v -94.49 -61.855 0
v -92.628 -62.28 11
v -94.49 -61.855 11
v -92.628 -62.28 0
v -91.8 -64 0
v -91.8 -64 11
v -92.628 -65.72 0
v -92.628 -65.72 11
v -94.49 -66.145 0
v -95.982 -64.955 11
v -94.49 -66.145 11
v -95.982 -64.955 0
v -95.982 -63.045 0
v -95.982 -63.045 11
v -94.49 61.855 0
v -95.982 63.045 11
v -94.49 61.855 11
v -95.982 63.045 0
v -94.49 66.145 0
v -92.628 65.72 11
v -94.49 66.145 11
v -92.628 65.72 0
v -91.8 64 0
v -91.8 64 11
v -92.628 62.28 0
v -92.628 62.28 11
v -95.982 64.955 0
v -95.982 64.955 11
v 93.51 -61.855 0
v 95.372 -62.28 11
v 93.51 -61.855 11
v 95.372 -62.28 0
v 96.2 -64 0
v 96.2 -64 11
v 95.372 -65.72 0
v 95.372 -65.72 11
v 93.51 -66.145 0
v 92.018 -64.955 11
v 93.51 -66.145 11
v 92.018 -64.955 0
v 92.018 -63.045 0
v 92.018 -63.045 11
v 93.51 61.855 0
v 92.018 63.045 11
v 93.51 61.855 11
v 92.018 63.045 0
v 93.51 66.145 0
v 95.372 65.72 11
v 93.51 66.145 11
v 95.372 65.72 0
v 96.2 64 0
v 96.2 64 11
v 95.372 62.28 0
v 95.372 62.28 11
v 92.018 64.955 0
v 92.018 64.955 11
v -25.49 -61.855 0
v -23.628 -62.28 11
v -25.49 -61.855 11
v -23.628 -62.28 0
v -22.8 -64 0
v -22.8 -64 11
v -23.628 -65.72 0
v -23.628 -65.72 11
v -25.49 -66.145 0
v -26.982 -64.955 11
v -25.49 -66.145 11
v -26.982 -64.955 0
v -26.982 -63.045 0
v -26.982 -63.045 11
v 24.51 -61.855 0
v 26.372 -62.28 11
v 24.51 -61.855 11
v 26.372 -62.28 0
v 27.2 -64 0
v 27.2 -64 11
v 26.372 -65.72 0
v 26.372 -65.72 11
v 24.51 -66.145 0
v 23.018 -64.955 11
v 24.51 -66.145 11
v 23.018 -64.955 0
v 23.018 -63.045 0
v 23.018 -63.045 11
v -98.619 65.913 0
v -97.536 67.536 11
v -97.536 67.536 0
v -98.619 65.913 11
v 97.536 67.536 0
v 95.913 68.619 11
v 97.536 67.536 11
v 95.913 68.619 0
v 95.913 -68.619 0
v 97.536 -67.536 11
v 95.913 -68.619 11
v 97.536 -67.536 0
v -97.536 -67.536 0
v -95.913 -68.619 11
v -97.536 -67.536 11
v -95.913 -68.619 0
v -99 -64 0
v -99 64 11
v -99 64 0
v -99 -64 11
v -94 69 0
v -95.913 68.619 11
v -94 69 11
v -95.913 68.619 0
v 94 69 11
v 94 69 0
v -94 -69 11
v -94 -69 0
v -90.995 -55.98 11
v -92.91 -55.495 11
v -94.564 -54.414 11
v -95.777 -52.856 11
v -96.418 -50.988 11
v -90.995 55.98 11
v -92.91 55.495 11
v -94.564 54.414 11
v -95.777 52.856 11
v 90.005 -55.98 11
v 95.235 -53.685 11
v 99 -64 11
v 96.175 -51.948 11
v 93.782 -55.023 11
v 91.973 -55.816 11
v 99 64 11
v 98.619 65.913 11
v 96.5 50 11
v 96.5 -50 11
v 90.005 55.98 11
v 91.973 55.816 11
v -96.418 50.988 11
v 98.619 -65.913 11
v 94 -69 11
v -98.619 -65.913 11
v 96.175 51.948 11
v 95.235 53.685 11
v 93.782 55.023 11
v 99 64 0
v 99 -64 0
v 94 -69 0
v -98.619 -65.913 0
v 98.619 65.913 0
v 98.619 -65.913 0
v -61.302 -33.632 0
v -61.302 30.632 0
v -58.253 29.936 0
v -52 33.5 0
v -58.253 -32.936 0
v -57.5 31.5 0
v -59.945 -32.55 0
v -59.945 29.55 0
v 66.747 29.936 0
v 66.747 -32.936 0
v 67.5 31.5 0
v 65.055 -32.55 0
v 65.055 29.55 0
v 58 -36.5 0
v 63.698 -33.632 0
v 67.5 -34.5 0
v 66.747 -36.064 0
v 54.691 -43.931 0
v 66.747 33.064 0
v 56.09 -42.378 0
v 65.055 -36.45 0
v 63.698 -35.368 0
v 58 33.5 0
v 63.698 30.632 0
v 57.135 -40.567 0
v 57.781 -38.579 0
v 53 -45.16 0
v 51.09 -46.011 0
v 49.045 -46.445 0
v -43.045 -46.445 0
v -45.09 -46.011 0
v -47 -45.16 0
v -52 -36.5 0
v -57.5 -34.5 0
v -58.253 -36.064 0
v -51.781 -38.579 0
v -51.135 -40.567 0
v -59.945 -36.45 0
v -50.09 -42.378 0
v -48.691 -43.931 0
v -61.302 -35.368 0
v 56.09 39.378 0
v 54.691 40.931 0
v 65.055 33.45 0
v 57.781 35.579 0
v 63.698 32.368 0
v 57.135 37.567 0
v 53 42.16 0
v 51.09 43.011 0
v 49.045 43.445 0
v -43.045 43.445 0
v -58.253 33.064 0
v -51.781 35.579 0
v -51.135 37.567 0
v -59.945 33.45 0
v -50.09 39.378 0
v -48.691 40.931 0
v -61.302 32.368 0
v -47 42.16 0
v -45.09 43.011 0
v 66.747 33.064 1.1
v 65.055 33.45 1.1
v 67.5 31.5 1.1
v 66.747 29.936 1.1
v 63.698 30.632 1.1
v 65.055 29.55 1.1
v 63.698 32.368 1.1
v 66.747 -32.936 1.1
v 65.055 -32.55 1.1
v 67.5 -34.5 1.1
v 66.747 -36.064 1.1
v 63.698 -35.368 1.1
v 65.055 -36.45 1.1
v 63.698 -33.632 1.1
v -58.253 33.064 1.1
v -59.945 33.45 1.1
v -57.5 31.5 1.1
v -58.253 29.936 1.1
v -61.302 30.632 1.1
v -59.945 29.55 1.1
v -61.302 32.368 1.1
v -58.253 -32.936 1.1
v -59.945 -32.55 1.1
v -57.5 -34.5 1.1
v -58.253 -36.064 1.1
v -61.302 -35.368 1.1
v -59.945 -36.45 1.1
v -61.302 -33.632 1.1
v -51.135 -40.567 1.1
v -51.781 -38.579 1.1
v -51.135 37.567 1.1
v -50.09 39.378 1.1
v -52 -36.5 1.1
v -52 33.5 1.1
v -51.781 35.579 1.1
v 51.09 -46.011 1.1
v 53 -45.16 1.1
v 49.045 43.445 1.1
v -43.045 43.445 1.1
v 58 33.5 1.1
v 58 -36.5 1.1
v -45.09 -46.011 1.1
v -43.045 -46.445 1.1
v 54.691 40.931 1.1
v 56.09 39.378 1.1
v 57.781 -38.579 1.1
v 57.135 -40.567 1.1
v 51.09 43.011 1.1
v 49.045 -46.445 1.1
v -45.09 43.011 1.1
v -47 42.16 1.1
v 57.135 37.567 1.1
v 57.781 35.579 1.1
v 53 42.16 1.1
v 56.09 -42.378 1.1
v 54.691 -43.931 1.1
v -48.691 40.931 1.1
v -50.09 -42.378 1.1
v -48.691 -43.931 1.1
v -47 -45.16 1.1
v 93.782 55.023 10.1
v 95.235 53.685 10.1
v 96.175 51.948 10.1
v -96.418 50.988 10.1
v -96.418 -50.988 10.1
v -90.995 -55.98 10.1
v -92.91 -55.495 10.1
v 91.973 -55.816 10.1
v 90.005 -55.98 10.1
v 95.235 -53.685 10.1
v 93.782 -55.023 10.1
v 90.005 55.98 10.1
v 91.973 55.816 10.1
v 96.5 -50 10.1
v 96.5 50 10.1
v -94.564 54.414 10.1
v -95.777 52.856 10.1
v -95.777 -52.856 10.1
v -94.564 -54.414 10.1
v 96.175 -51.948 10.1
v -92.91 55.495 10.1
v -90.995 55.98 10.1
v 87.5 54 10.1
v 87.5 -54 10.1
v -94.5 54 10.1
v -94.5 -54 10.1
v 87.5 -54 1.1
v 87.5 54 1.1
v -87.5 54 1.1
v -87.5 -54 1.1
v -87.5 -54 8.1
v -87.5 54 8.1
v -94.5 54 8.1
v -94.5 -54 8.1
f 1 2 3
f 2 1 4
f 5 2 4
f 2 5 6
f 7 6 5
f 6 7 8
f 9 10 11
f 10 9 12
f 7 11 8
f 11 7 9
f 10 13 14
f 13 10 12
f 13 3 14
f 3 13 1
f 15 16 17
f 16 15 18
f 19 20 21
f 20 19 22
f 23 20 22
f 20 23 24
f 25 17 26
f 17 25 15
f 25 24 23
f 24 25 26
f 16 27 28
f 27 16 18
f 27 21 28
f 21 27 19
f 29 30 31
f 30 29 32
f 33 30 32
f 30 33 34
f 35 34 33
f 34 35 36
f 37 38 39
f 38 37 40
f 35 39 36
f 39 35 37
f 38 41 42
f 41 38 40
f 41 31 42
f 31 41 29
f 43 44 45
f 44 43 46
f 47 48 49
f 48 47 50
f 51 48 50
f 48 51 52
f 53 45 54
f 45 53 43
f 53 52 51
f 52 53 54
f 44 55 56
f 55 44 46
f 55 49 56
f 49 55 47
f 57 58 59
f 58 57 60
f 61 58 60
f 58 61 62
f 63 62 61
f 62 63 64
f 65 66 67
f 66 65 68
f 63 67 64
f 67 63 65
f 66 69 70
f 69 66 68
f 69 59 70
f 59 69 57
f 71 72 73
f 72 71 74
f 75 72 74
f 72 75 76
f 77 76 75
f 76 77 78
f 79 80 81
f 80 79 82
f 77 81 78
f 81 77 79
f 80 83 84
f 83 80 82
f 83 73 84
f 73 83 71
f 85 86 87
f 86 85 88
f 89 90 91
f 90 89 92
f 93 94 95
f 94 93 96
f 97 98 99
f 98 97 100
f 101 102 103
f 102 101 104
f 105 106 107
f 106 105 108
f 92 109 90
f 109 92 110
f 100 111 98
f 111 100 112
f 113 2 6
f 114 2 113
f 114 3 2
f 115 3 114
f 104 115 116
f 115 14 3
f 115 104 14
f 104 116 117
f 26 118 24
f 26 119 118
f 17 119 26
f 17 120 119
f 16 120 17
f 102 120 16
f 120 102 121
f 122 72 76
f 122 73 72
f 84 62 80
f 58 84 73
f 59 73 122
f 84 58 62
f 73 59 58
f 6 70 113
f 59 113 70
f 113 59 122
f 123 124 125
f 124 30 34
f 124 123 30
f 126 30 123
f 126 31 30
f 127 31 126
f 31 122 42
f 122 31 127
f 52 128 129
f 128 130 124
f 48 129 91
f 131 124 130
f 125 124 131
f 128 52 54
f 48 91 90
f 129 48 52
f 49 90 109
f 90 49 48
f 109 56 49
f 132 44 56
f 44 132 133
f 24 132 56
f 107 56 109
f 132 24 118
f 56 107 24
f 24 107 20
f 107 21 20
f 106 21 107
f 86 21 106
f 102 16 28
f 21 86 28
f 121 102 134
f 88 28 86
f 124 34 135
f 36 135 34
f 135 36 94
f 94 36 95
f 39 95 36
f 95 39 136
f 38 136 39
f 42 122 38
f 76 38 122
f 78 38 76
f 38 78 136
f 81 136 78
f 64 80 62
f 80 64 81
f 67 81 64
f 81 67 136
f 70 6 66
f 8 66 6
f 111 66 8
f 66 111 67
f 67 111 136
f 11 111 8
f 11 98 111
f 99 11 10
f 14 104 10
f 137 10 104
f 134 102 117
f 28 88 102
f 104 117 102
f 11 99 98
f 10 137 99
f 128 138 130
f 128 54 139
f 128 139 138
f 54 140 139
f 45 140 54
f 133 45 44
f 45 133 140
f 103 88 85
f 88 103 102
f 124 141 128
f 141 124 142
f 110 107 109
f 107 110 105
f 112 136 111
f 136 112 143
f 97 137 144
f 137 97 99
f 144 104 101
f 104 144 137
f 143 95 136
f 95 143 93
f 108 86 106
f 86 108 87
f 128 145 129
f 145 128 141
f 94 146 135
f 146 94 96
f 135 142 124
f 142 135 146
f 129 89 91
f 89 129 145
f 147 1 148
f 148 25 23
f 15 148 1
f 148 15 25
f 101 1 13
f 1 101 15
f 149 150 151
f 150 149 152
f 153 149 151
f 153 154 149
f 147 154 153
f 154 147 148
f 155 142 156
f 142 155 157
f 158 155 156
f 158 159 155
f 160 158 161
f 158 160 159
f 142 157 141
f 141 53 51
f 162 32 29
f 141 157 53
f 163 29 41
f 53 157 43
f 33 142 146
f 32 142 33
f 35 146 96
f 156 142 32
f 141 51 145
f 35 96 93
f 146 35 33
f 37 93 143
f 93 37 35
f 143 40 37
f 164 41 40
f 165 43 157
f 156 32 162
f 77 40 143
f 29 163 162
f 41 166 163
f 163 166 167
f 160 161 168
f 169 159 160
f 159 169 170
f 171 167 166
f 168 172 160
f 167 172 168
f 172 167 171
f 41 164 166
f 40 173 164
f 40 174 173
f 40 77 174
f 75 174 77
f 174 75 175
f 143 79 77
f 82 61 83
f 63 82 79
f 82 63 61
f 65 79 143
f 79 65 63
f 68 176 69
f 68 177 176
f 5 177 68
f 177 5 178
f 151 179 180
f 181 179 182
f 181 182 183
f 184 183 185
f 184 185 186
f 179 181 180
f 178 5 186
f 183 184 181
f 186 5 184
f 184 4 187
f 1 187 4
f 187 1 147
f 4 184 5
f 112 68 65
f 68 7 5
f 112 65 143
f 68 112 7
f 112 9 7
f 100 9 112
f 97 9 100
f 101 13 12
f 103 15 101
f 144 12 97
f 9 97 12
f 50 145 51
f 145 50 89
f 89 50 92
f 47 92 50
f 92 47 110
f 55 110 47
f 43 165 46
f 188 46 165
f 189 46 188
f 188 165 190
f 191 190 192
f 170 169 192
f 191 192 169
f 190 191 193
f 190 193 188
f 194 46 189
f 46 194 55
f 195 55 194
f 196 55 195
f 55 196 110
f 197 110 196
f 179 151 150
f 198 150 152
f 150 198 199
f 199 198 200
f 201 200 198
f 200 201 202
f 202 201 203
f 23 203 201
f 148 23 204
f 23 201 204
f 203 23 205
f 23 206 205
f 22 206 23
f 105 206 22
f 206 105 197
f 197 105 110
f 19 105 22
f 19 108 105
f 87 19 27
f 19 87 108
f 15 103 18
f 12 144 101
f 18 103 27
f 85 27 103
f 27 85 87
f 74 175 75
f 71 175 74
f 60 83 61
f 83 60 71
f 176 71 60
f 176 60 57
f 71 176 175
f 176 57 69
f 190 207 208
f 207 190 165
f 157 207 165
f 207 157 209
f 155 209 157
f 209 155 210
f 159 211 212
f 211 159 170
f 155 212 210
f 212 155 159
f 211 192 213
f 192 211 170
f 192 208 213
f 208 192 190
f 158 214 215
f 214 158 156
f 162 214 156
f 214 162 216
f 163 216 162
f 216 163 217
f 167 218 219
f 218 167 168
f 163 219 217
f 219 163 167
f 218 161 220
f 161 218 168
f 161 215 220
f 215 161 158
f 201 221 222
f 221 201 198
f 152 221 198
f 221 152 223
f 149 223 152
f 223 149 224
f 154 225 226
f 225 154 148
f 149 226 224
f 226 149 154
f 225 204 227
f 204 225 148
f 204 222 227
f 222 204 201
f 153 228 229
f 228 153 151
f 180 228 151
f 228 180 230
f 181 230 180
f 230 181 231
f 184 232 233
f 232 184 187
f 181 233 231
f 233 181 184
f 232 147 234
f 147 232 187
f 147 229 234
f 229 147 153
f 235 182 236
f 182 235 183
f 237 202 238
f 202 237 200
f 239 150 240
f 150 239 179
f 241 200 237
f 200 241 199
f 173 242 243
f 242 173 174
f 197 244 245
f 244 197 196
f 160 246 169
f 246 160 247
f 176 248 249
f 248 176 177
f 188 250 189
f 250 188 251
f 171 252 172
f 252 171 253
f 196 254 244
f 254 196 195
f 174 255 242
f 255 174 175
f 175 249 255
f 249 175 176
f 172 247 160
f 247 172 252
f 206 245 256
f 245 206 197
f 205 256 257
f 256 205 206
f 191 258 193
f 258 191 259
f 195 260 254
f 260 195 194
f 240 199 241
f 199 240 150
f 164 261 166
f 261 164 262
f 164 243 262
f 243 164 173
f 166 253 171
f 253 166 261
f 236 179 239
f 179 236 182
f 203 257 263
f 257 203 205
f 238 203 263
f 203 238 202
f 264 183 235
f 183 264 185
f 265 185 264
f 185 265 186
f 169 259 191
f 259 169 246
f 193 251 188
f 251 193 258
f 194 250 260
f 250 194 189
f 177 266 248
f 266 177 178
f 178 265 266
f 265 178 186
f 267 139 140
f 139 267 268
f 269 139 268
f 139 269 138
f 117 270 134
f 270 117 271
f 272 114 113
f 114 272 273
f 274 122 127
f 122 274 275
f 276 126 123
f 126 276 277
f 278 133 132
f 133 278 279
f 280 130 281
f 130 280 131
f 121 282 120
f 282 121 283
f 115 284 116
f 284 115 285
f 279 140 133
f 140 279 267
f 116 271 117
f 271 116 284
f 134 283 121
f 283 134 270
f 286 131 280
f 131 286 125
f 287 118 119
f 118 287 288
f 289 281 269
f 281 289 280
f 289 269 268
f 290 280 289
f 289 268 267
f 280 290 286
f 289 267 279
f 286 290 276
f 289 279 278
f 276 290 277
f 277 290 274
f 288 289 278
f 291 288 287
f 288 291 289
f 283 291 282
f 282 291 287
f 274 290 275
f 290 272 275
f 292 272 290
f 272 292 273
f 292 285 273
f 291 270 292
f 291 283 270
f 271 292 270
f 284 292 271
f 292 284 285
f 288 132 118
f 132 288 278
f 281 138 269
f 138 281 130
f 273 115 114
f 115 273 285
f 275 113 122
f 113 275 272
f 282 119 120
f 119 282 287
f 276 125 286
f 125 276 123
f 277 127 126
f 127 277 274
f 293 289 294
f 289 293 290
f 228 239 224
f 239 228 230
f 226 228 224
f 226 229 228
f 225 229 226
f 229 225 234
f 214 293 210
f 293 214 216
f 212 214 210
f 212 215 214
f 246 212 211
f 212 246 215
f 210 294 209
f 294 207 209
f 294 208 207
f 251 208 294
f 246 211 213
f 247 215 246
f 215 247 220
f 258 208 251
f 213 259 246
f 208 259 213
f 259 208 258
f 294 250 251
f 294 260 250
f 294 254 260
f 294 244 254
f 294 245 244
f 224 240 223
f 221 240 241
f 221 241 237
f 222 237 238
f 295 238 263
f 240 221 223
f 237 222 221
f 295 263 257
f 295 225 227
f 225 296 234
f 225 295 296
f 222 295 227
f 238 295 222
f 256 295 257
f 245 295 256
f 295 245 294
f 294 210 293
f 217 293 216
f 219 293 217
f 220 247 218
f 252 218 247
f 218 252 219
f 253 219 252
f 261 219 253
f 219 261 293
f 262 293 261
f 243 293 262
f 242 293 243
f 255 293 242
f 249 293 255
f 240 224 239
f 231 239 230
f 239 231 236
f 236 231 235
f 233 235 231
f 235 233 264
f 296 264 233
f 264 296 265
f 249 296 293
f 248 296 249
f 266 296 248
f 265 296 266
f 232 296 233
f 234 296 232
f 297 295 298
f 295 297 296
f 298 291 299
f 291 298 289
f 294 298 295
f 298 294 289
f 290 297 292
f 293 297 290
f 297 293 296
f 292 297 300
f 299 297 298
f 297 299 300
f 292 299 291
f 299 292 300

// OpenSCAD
//translate([100,-70+x,0]) import("component/pi_model_v4.stl");
//translate([-100,59,0])  rotate([90,0,0]) import("component/screen_fond.stl");

screen_l = 193;
screen_lg = 112;
screen_r = 6;

trou_l = 125;
trou_lg = 66;
d_e1 = 3;
d_e2 = -1.5;
screen_vis = [[trou_l/2+d_e1, trou_lg/2+d_e2], [trou_l/2+d_e1, -trou_lg/2+d_e2]
    , [-trou_l/2+d_e1, trou_lg/2+d_e2], [-trou_l/2+d_e1, -trou_lg/2+d_e2]];

boitier_l = 200;
boitier_lg = 140;
boitier_y = -boitier_lg/2-10;

boitier_h = 40;

vis_r1 = 2.2;
vis_r2 = 4.2;

x =0;

y_camera = -boitier_lg/2+6;

//$fn=50;

module screen_int(){
    screen_l_int = 110;
    screen_lg_int = 90;
    r_int = 10;
    for(vis = screen_vis){
        translate(vis) cylinder(r=2, 20);
    }
    hull(){
        for(i=[-1,1]){
            for(j=[-1,1]){
                translate([i*(screen_l_int/2-r_int)+d_e1, j*(screen_lg_int/2-r_int)+d_e2, 0]) cylinder(r=r_int, 20);
            }
        }
    }
}

module screen(){
    screen_e = 1;
    screen_y = 66;
    
    screen_l_cube = 175;
    screen_lg_cube = 108;
    
    union(){
        hull(){
            for(i=[-1,1]){
                for(j=[-1,1]){
                    translate([i*(screen_l/2-screen_r), j*(screen_lg/2-screen_r), 0]) cylinder(r=screen_r, screen_e);
                }
            }
        }
        translate([-screen_l_cube/2,-screen_lg_cube/2,0]) cube([screen_l_cube,screen_lg_cube, 10]);
        translate([-screen_l_cube/2-7,-screen_lg_cube/2,0]) cube([screen_l_cube,screen_lg_cube, 3]);
    
        screen_int();
    }
}

module boitier(h){
    r = 6;
    difference(){
        hull(){
            for(i=[-1,1]){
                for(j=[-1,1]){
                    translate([i*(boitier_l/2-r), j*(boitier_lg/2-r), 0]) cylinder(r=5, h);
                }
            }
        }
        for(i=[-1,1]){
            for(j=[-1,1]){
                translate([i*(boitier_l/2-r), j*(boitier_lg/2-r), -1]) cylinder(r=vis_r1, h+2);
            }
        }
        
        for(i=[-1,1]){
            translate([i*25, y_camera, -1]) cylinder(r=vis_r1, h+2);
        }
    }
        
}


module screen_fond(){
    e = 11;
    l = 200;
    lg = 150;
    difference(){
        boitier(e);
        translate([0,x,e+0.1]) mirror([0,0,1])screen();
    }
}


module screen_up(){
    e = 3;
    r = 6;
   difference(){
        mirror([0,1,0])boitier(boitier_h);
        translate([0,-x,e+0.1]) mirror([0,0,1])screen_int();
        hull(){
            for(i=[-1,1]){
                for(j=[-1,1]){
                    translate([i*(boitier_l/2-15), -(boitier_lg/2-r-e), e]) cylinder(r=5, boitier_h+2);
                    translate([i*(boitier_l/2-15), -(-boitier_lg/2+30), e]) cylinder(r=5, boitier_h+2);
                }
            }
        }
        for(i=[-1,1]){
            translate([i*50, boitier_lg/2-10, boitier_h/2+e/2])  rotate([90,0,0])cylinder(r=vis_r2, 50, center = true);
        }
        translate([0,0, boitier_h/2+e/2])  rotate([0,90,0])cylinder(r=vis_r2, boitier_l+10, center = true);
        
        translate([0, boitier_lg/2-10, boitier_h/2+e/2]) cube([25, 50, 3], center = true);
        translate([-25/2, boitier_lg/2-4, boitier_h/2+e/2]) cube([25, 4, boitier_h]);
    }
    
    
}



z_rond = 20;
support_camera_rond_r = 10;
module support_camera1(){
    e = 5;
    z= z_rond;
    r1 = 5;
    z1 = 10;
    difference(){
        union(){
            hull(){
                translate([-25,0, 0])  cylinder(r=5, e);
                translate([25,0, 0])  cylinder(r=5, e);
                
                cylinder(r=10, e);
                
            }
            
            hull(){
                translate([0,0, z1])  sphere(r=r1); cylinder(r=10, e);
                
            }
            
             hull(){
                translate([0,0, z])  sphere(r=support_camera_rond_r); 
                translate([0,0, z1])  sphere(r=r1); 
                
            }
        }
        translate([-25,0, -1])  cylinder(r=2, e+2);
        translate([25,0, -1])  cylinder(r=2, e+2);
        
        hull(){
            translate([-12.5, 2, -1]) cube([25,100,2]);
            translate([0,8, 10]) rotate([0,90,0]) cylinder(r=2, 25, center=true);
        }
                
    }
    
}

module support_camera2(){
    e=3;
    l=38;
    l3=20;
    l2=18;
    r = 4;
    
    dz_rond = 12;
    difference(){
        union(){
            for(i=[0,1]){
                mirror([i,0,0]) translate([l2/2,-l3/2,0])cube([e, l3, l]);
            }
            translate([-l2/2-e,-l3/2,0])cube([l2+2*e, l, e]);
        }
        translate([0,0, z_rond])  rotate([0,90,0])cylinder(r=r, l+e+10, center = true);
        translate([0,0, z_rond - dz_rond])  rotate([0,90,0])cylinder(r=2, l+e+10, center = true);
        translate([0,0, z_rond + dz_rond])  rotate([0,90,0])cylinder(r=2, l+e+10, center = true);
            
        
    }
    
    %translate([0,0, z_rond + dz_rond])  rotate([0,90,0])cylinder(r=2, l+e+10, center = true);
    %translate([0,0, z_rond - dz_rond])  rotate([0,90,0])cylinder(r=2, l+e+10, center = true);
        
    z= 15;
    r1 = 5;
    z1 = 10;
    
}

mode = 2;
if(mode==0){
    //translate([0, -x, -10.2])screen();
    //rotate([0,0,180]) translate([100,-70-x,10]) color("blue") import("component/pi_model_v4.stl");
    //translate([20,-70/3,10]) color("blue") cube([70,55,20]);
    
    translate([0,0,0.2])screen_up();
    rotate([0,180,180])screen_fond();
    translate([0,-y_camera,boitier_h])support_camera1();
    
    translate([0,-y_camera,z_rond+boitier_h]) rotate([-90,180,180]) translate([0,0,-z_rond]) support_camera2();
} else if(mode==1){
    screen_up();
} else if(mode==2){
    screen_fond();
} else if(mode==3){
    support_camera1();
} else if(mode==4){
    support_camera2();
}
